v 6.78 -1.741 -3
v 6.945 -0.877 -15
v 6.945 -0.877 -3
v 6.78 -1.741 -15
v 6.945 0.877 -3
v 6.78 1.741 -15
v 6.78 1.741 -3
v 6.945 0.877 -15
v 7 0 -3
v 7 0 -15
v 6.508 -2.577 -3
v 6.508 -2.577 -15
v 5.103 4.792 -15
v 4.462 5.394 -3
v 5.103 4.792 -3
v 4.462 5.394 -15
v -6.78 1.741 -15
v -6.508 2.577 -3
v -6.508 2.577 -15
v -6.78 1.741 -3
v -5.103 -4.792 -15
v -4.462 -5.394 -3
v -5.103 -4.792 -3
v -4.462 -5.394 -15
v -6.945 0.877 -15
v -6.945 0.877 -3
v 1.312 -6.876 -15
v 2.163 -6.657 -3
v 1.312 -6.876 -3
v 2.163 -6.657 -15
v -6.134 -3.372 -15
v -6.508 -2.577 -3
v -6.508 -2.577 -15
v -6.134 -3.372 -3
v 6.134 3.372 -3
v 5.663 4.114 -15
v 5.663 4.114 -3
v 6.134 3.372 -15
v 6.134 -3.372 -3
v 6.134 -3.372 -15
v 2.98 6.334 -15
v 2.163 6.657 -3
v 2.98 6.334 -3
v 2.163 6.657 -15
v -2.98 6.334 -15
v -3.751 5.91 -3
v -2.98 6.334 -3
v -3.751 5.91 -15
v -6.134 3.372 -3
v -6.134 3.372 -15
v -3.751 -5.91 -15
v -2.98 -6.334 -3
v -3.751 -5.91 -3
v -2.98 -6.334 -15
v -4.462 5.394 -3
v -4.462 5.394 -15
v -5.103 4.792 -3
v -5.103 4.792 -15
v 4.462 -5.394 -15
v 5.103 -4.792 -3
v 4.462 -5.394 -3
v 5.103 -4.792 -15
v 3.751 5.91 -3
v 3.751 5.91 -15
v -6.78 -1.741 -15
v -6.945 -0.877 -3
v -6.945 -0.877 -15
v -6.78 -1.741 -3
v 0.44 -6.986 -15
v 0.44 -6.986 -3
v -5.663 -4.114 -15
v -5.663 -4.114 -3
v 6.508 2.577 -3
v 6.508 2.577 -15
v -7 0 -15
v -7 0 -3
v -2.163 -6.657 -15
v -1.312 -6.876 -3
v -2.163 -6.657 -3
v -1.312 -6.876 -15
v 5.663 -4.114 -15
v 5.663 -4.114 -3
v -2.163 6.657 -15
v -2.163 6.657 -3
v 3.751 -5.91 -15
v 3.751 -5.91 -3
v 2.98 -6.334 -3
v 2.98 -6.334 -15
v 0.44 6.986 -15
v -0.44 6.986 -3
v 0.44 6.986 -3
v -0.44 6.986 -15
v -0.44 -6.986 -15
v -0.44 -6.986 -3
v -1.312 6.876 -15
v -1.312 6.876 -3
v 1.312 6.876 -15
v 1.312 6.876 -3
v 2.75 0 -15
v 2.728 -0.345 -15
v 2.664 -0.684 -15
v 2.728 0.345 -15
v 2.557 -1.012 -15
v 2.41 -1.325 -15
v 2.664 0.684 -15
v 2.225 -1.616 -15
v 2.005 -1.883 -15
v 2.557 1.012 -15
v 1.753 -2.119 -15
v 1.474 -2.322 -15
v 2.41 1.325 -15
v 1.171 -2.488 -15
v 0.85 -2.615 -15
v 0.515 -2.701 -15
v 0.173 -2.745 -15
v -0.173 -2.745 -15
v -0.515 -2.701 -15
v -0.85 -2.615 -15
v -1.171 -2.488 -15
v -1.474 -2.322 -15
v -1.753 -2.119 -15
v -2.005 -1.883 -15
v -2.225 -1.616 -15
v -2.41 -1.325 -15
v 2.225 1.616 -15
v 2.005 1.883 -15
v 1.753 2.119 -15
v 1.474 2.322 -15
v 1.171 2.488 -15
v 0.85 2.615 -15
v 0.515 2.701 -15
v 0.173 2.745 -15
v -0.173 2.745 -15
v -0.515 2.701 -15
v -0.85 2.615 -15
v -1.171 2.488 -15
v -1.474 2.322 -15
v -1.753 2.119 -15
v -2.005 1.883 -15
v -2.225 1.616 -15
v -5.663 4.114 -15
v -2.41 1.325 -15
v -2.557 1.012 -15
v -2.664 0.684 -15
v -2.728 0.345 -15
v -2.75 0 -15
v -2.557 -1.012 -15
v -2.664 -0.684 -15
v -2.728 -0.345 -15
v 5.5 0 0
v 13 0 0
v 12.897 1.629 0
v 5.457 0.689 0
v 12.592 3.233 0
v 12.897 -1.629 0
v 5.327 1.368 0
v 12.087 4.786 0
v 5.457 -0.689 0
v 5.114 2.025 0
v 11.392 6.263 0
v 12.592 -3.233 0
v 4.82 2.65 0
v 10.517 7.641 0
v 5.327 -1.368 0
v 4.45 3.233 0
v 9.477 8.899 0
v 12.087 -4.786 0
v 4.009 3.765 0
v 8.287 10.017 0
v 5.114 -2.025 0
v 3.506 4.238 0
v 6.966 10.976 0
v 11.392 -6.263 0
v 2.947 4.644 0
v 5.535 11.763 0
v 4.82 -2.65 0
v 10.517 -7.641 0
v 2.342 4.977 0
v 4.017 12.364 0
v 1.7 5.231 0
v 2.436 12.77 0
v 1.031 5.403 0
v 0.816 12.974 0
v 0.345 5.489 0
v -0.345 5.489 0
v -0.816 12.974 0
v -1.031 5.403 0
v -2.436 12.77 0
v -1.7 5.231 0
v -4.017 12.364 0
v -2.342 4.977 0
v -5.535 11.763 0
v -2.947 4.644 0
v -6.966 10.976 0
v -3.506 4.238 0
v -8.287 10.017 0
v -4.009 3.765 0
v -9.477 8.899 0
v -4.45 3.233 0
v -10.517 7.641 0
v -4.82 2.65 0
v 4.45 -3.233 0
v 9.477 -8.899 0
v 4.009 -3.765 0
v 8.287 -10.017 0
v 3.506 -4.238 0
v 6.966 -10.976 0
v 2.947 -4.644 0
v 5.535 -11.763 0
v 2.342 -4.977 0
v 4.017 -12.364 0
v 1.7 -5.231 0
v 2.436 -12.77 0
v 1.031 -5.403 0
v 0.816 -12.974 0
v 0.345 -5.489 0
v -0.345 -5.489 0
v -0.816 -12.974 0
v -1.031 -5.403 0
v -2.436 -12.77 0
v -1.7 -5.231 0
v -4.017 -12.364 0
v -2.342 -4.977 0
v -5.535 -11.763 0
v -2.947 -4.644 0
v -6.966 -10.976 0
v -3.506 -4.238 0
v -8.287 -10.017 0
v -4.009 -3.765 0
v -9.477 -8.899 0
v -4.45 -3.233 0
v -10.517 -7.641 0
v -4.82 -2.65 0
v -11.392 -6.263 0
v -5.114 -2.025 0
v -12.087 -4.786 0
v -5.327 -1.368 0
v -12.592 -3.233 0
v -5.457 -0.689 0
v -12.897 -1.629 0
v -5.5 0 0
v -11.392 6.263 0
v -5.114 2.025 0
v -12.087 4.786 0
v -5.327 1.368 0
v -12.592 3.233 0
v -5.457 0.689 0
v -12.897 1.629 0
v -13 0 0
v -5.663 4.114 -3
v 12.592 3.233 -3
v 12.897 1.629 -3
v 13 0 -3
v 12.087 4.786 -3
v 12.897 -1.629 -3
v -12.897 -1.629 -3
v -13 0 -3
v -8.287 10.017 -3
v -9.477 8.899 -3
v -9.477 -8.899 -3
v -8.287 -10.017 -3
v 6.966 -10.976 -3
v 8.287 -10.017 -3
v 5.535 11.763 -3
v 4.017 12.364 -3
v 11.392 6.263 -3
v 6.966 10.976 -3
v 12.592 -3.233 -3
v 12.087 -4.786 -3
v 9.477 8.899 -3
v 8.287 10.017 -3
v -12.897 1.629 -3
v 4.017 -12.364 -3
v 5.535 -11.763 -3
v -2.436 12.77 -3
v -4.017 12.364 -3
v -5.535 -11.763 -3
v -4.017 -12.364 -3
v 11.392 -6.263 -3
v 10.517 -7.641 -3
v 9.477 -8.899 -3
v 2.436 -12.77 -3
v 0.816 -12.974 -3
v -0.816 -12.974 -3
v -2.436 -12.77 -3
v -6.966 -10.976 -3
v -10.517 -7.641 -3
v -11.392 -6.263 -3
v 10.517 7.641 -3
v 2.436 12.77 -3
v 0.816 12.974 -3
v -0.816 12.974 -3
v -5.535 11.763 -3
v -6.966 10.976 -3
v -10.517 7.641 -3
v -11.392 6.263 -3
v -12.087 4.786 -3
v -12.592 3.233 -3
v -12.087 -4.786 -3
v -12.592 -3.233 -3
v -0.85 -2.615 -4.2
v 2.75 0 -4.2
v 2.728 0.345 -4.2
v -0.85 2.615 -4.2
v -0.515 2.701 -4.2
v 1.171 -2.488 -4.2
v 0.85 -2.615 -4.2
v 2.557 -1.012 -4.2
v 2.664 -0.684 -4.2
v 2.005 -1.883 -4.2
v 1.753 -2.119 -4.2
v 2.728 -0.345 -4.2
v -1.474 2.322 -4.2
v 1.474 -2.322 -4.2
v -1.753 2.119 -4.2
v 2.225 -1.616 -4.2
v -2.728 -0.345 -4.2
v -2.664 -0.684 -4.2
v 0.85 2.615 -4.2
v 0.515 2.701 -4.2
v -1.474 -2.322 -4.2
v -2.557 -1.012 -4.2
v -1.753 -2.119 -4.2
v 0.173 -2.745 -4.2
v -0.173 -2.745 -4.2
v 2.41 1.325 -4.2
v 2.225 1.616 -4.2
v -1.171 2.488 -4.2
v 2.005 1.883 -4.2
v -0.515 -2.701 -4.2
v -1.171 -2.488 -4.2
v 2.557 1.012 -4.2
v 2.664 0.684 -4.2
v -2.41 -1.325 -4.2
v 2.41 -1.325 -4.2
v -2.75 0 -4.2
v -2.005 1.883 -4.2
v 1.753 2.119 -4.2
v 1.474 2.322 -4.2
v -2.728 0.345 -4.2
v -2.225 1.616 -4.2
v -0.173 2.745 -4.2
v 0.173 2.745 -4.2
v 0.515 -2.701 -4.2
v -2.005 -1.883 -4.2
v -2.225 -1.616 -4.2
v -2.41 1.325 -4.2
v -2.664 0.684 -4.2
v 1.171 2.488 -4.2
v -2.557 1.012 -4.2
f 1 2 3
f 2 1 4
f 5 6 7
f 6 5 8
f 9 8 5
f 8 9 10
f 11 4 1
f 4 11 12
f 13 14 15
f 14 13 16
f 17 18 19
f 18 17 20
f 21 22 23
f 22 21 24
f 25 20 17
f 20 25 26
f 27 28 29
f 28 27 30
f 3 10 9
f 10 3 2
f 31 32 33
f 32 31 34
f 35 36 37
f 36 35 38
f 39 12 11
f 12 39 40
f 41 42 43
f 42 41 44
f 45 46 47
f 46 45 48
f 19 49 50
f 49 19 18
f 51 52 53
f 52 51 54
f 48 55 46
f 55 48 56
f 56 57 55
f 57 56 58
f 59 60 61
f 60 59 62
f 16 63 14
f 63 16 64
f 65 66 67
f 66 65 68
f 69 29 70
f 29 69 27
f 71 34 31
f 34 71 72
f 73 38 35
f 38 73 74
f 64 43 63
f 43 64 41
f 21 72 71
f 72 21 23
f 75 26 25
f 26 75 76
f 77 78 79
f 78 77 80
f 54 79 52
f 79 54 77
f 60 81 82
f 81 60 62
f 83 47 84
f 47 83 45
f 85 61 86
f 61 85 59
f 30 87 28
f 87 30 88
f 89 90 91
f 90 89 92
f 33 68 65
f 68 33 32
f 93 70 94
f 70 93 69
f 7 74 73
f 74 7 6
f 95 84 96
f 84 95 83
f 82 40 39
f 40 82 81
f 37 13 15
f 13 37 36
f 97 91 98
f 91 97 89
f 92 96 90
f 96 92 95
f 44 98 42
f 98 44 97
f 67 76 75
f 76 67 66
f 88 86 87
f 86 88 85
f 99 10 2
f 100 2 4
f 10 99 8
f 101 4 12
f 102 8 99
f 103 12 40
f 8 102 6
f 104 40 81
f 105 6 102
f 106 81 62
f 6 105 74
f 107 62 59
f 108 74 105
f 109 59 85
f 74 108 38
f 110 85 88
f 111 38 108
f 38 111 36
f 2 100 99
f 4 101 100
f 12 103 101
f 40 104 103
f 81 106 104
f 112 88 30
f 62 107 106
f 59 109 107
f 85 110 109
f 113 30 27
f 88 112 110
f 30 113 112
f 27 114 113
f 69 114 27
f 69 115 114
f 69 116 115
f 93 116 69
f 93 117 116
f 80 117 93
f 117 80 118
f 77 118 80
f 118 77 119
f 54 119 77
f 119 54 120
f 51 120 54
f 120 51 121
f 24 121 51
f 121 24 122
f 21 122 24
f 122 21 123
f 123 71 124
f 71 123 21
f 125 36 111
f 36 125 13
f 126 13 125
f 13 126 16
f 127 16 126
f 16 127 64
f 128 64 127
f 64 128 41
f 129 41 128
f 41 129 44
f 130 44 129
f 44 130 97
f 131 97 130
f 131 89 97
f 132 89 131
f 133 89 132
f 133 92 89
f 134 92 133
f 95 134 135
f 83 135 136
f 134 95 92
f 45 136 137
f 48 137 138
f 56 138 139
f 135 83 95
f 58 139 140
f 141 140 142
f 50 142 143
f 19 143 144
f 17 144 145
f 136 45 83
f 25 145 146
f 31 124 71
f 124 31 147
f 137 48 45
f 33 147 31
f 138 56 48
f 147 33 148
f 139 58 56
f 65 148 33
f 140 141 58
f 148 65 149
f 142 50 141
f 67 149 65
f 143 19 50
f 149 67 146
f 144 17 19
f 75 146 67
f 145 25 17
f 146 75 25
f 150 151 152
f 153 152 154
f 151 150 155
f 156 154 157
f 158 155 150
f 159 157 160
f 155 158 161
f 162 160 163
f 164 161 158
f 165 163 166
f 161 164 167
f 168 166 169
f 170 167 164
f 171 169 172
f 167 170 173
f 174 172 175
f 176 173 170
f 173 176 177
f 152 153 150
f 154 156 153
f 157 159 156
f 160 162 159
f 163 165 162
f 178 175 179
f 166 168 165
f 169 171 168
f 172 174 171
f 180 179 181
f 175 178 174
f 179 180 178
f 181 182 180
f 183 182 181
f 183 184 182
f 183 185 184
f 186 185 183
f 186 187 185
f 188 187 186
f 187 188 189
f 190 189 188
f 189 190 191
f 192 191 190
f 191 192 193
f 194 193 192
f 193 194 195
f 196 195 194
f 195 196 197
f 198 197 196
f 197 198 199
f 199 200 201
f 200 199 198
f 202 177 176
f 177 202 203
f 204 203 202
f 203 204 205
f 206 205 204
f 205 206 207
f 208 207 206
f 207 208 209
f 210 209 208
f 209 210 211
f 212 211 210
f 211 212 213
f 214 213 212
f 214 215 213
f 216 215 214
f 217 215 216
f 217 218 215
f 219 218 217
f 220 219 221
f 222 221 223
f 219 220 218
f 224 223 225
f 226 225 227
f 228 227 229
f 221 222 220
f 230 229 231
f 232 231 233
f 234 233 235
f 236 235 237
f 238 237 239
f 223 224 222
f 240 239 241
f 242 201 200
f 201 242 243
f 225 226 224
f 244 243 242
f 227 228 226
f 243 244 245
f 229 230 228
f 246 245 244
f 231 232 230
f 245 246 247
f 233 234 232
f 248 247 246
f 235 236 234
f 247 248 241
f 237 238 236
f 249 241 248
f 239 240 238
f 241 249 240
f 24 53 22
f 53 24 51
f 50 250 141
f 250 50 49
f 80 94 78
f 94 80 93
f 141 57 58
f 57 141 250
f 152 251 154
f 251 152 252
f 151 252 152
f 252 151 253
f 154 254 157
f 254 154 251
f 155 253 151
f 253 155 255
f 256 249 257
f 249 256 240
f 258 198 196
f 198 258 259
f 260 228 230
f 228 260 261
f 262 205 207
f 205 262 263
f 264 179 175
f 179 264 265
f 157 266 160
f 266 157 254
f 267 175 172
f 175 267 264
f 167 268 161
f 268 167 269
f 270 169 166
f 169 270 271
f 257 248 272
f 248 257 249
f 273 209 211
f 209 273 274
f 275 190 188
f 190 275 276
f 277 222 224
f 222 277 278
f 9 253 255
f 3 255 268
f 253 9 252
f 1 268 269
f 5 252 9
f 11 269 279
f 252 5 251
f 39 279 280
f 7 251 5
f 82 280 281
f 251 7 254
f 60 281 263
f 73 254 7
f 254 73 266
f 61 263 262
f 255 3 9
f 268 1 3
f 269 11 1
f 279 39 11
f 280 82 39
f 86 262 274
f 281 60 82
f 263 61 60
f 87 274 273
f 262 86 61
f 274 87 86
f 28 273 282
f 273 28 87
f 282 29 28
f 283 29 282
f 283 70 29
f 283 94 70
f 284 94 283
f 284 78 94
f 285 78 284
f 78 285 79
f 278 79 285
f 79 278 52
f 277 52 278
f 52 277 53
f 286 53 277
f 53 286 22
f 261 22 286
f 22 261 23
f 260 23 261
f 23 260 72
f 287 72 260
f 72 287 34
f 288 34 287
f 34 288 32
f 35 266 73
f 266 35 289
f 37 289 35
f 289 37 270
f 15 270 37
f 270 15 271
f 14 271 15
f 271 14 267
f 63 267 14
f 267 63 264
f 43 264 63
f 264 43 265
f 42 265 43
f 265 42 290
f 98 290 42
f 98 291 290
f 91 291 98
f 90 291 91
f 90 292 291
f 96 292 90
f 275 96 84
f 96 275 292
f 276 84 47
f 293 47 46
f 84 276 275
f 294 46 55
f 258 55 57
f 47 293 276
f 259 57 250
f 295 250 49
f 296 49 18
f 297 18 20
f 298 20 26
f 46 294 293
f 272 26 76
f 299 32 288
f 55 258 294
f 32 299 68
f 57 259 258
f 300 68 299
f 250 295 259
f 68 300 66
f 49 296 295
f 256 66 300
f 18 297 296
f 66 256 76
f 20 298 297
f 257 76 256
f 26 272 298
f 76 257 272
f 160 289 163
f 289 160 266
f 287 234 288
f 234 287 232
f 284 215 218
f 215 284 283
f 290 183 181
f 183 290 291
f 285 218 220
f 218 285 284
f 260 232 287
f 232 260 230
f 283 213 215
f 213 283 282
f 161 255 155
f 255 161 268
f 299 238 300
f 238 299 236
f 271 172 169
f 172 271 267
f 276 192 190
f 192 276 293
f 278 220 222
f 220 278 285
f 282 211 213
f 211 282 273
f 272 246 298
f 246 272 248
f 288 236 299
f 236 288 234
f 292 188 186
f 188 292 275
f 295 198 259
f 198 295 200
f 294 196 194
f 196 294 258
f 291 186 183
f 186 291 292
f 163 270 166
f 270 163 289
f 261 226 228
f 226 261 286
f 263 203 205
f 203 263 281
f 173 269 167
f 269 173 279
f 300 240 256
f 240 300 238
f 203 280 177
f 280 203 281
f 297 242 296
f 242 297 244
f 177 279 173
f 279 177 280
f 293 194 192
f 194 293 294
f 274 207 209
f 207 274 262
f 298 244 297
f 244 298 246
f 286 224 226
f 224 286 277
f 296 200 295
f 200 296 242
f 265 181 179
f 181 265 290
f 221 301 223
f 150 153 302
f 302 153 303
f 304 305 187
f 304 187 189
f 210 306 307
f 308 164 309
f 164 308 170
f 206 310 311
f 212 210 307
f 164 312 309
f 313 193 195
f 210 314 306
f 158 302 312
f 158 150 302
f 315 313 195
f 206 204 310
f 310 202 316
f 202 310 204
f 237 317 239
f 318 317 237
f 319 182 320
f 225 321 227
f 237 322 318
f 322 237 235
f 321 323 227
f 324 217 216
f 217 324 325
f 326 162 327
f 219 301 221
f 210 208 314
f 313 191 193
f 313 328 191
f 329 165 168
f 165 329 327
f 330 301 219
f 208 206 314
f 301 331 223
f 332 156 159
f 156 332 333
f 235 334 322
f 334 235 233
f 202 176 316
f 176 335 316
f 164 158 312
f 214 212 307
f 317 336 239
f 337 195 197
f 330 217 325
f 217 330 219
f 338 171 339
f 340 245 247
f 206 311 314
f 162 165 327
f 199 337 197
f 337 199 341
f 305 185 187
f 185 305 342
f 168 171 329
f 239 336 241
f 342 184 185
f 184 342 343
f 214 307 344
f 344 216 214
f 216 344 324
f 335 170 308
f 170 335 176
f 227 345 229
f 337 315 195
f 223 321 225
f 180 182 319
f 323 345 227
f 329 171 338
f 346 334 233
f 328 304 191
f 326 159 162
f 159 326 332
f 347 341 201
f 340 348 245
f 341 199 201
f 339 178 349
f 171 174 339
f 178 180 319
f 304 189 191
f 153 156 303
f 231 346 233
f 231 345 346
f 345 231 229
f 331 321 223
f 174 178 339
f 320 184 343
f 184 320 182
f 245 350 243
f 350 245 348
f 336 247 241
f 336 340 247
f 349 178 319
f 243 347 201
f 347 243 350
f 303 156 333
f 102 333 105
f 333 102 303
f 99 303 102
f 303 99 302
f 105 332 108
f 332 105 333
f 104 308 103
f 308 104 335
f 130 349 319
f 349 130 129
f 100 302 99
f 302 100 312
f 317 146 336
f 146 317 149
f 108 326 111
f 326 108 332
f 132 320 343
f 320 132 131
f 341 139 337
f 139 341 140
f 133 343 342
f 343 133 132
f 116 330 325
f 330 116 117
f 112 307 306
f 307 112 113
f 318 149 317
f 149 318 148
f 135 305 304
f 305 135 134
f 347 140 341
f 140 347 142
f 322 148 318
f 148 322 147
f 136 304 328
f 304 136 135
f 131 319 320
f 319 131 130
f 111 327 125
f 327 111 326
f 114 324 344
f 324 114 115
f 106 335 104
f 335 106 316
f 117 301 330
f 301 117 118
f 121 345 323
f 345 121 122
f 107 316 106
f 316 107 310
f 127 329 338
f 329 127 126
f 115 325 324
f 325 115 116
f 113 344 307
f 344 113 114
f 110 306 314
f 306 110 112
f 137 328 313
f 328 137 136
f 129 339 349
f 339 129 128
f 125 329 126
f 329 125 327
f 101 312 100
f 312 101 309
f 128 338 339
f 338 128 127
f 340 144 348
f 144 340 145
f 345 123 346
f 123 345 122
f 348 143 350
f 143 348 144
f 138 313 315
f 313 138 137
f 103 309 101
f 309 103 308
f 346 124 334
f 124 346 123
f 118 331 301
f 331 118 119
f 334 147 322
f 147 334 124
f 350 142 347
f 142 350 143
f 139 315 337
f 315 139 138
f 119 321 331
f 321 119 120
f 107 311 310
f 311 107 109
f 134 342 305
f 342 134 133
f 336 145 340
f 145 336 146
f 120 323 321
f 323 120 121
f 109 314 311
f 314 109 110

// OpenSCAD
$fn = 50;


difference() {
	union() {
		translate(v = [0, 0, -15.0000000000]) {
			cylinder(h = 15, r = 7.0000000000);
		}
		translate(v = [0, 0, -3.0000000000]) {
			cylinder(h = 3, r = 13.0000000000);
		}
	}
	union() {
		translate(v = [0, 0, 0]) {
			rotate(a = [0, 0, 0]) {
				difference() {
					union() {
						#translate(v = [0, 0, -15.0000000000]) {
							cylinder(h = 15, r = 2.2500000000);
						}
						#translate(v = [0, 0, -4.2000000000]) {
							cylinder(h = 4.2000000000, r1 = 2.7500000000, r2 = 5.5000000000);
						}
						#translate(v = [0, 0, -15.0000000000]) {
							cylinder(h = 15, r = 2.7500000000);
						}
						#translate(v = [0, 0, -15.0000000000]) {
							cylinder(h = 15, r = 2.2500000000);
						}
					}
					union();
				}
			}
		}
	}
}
